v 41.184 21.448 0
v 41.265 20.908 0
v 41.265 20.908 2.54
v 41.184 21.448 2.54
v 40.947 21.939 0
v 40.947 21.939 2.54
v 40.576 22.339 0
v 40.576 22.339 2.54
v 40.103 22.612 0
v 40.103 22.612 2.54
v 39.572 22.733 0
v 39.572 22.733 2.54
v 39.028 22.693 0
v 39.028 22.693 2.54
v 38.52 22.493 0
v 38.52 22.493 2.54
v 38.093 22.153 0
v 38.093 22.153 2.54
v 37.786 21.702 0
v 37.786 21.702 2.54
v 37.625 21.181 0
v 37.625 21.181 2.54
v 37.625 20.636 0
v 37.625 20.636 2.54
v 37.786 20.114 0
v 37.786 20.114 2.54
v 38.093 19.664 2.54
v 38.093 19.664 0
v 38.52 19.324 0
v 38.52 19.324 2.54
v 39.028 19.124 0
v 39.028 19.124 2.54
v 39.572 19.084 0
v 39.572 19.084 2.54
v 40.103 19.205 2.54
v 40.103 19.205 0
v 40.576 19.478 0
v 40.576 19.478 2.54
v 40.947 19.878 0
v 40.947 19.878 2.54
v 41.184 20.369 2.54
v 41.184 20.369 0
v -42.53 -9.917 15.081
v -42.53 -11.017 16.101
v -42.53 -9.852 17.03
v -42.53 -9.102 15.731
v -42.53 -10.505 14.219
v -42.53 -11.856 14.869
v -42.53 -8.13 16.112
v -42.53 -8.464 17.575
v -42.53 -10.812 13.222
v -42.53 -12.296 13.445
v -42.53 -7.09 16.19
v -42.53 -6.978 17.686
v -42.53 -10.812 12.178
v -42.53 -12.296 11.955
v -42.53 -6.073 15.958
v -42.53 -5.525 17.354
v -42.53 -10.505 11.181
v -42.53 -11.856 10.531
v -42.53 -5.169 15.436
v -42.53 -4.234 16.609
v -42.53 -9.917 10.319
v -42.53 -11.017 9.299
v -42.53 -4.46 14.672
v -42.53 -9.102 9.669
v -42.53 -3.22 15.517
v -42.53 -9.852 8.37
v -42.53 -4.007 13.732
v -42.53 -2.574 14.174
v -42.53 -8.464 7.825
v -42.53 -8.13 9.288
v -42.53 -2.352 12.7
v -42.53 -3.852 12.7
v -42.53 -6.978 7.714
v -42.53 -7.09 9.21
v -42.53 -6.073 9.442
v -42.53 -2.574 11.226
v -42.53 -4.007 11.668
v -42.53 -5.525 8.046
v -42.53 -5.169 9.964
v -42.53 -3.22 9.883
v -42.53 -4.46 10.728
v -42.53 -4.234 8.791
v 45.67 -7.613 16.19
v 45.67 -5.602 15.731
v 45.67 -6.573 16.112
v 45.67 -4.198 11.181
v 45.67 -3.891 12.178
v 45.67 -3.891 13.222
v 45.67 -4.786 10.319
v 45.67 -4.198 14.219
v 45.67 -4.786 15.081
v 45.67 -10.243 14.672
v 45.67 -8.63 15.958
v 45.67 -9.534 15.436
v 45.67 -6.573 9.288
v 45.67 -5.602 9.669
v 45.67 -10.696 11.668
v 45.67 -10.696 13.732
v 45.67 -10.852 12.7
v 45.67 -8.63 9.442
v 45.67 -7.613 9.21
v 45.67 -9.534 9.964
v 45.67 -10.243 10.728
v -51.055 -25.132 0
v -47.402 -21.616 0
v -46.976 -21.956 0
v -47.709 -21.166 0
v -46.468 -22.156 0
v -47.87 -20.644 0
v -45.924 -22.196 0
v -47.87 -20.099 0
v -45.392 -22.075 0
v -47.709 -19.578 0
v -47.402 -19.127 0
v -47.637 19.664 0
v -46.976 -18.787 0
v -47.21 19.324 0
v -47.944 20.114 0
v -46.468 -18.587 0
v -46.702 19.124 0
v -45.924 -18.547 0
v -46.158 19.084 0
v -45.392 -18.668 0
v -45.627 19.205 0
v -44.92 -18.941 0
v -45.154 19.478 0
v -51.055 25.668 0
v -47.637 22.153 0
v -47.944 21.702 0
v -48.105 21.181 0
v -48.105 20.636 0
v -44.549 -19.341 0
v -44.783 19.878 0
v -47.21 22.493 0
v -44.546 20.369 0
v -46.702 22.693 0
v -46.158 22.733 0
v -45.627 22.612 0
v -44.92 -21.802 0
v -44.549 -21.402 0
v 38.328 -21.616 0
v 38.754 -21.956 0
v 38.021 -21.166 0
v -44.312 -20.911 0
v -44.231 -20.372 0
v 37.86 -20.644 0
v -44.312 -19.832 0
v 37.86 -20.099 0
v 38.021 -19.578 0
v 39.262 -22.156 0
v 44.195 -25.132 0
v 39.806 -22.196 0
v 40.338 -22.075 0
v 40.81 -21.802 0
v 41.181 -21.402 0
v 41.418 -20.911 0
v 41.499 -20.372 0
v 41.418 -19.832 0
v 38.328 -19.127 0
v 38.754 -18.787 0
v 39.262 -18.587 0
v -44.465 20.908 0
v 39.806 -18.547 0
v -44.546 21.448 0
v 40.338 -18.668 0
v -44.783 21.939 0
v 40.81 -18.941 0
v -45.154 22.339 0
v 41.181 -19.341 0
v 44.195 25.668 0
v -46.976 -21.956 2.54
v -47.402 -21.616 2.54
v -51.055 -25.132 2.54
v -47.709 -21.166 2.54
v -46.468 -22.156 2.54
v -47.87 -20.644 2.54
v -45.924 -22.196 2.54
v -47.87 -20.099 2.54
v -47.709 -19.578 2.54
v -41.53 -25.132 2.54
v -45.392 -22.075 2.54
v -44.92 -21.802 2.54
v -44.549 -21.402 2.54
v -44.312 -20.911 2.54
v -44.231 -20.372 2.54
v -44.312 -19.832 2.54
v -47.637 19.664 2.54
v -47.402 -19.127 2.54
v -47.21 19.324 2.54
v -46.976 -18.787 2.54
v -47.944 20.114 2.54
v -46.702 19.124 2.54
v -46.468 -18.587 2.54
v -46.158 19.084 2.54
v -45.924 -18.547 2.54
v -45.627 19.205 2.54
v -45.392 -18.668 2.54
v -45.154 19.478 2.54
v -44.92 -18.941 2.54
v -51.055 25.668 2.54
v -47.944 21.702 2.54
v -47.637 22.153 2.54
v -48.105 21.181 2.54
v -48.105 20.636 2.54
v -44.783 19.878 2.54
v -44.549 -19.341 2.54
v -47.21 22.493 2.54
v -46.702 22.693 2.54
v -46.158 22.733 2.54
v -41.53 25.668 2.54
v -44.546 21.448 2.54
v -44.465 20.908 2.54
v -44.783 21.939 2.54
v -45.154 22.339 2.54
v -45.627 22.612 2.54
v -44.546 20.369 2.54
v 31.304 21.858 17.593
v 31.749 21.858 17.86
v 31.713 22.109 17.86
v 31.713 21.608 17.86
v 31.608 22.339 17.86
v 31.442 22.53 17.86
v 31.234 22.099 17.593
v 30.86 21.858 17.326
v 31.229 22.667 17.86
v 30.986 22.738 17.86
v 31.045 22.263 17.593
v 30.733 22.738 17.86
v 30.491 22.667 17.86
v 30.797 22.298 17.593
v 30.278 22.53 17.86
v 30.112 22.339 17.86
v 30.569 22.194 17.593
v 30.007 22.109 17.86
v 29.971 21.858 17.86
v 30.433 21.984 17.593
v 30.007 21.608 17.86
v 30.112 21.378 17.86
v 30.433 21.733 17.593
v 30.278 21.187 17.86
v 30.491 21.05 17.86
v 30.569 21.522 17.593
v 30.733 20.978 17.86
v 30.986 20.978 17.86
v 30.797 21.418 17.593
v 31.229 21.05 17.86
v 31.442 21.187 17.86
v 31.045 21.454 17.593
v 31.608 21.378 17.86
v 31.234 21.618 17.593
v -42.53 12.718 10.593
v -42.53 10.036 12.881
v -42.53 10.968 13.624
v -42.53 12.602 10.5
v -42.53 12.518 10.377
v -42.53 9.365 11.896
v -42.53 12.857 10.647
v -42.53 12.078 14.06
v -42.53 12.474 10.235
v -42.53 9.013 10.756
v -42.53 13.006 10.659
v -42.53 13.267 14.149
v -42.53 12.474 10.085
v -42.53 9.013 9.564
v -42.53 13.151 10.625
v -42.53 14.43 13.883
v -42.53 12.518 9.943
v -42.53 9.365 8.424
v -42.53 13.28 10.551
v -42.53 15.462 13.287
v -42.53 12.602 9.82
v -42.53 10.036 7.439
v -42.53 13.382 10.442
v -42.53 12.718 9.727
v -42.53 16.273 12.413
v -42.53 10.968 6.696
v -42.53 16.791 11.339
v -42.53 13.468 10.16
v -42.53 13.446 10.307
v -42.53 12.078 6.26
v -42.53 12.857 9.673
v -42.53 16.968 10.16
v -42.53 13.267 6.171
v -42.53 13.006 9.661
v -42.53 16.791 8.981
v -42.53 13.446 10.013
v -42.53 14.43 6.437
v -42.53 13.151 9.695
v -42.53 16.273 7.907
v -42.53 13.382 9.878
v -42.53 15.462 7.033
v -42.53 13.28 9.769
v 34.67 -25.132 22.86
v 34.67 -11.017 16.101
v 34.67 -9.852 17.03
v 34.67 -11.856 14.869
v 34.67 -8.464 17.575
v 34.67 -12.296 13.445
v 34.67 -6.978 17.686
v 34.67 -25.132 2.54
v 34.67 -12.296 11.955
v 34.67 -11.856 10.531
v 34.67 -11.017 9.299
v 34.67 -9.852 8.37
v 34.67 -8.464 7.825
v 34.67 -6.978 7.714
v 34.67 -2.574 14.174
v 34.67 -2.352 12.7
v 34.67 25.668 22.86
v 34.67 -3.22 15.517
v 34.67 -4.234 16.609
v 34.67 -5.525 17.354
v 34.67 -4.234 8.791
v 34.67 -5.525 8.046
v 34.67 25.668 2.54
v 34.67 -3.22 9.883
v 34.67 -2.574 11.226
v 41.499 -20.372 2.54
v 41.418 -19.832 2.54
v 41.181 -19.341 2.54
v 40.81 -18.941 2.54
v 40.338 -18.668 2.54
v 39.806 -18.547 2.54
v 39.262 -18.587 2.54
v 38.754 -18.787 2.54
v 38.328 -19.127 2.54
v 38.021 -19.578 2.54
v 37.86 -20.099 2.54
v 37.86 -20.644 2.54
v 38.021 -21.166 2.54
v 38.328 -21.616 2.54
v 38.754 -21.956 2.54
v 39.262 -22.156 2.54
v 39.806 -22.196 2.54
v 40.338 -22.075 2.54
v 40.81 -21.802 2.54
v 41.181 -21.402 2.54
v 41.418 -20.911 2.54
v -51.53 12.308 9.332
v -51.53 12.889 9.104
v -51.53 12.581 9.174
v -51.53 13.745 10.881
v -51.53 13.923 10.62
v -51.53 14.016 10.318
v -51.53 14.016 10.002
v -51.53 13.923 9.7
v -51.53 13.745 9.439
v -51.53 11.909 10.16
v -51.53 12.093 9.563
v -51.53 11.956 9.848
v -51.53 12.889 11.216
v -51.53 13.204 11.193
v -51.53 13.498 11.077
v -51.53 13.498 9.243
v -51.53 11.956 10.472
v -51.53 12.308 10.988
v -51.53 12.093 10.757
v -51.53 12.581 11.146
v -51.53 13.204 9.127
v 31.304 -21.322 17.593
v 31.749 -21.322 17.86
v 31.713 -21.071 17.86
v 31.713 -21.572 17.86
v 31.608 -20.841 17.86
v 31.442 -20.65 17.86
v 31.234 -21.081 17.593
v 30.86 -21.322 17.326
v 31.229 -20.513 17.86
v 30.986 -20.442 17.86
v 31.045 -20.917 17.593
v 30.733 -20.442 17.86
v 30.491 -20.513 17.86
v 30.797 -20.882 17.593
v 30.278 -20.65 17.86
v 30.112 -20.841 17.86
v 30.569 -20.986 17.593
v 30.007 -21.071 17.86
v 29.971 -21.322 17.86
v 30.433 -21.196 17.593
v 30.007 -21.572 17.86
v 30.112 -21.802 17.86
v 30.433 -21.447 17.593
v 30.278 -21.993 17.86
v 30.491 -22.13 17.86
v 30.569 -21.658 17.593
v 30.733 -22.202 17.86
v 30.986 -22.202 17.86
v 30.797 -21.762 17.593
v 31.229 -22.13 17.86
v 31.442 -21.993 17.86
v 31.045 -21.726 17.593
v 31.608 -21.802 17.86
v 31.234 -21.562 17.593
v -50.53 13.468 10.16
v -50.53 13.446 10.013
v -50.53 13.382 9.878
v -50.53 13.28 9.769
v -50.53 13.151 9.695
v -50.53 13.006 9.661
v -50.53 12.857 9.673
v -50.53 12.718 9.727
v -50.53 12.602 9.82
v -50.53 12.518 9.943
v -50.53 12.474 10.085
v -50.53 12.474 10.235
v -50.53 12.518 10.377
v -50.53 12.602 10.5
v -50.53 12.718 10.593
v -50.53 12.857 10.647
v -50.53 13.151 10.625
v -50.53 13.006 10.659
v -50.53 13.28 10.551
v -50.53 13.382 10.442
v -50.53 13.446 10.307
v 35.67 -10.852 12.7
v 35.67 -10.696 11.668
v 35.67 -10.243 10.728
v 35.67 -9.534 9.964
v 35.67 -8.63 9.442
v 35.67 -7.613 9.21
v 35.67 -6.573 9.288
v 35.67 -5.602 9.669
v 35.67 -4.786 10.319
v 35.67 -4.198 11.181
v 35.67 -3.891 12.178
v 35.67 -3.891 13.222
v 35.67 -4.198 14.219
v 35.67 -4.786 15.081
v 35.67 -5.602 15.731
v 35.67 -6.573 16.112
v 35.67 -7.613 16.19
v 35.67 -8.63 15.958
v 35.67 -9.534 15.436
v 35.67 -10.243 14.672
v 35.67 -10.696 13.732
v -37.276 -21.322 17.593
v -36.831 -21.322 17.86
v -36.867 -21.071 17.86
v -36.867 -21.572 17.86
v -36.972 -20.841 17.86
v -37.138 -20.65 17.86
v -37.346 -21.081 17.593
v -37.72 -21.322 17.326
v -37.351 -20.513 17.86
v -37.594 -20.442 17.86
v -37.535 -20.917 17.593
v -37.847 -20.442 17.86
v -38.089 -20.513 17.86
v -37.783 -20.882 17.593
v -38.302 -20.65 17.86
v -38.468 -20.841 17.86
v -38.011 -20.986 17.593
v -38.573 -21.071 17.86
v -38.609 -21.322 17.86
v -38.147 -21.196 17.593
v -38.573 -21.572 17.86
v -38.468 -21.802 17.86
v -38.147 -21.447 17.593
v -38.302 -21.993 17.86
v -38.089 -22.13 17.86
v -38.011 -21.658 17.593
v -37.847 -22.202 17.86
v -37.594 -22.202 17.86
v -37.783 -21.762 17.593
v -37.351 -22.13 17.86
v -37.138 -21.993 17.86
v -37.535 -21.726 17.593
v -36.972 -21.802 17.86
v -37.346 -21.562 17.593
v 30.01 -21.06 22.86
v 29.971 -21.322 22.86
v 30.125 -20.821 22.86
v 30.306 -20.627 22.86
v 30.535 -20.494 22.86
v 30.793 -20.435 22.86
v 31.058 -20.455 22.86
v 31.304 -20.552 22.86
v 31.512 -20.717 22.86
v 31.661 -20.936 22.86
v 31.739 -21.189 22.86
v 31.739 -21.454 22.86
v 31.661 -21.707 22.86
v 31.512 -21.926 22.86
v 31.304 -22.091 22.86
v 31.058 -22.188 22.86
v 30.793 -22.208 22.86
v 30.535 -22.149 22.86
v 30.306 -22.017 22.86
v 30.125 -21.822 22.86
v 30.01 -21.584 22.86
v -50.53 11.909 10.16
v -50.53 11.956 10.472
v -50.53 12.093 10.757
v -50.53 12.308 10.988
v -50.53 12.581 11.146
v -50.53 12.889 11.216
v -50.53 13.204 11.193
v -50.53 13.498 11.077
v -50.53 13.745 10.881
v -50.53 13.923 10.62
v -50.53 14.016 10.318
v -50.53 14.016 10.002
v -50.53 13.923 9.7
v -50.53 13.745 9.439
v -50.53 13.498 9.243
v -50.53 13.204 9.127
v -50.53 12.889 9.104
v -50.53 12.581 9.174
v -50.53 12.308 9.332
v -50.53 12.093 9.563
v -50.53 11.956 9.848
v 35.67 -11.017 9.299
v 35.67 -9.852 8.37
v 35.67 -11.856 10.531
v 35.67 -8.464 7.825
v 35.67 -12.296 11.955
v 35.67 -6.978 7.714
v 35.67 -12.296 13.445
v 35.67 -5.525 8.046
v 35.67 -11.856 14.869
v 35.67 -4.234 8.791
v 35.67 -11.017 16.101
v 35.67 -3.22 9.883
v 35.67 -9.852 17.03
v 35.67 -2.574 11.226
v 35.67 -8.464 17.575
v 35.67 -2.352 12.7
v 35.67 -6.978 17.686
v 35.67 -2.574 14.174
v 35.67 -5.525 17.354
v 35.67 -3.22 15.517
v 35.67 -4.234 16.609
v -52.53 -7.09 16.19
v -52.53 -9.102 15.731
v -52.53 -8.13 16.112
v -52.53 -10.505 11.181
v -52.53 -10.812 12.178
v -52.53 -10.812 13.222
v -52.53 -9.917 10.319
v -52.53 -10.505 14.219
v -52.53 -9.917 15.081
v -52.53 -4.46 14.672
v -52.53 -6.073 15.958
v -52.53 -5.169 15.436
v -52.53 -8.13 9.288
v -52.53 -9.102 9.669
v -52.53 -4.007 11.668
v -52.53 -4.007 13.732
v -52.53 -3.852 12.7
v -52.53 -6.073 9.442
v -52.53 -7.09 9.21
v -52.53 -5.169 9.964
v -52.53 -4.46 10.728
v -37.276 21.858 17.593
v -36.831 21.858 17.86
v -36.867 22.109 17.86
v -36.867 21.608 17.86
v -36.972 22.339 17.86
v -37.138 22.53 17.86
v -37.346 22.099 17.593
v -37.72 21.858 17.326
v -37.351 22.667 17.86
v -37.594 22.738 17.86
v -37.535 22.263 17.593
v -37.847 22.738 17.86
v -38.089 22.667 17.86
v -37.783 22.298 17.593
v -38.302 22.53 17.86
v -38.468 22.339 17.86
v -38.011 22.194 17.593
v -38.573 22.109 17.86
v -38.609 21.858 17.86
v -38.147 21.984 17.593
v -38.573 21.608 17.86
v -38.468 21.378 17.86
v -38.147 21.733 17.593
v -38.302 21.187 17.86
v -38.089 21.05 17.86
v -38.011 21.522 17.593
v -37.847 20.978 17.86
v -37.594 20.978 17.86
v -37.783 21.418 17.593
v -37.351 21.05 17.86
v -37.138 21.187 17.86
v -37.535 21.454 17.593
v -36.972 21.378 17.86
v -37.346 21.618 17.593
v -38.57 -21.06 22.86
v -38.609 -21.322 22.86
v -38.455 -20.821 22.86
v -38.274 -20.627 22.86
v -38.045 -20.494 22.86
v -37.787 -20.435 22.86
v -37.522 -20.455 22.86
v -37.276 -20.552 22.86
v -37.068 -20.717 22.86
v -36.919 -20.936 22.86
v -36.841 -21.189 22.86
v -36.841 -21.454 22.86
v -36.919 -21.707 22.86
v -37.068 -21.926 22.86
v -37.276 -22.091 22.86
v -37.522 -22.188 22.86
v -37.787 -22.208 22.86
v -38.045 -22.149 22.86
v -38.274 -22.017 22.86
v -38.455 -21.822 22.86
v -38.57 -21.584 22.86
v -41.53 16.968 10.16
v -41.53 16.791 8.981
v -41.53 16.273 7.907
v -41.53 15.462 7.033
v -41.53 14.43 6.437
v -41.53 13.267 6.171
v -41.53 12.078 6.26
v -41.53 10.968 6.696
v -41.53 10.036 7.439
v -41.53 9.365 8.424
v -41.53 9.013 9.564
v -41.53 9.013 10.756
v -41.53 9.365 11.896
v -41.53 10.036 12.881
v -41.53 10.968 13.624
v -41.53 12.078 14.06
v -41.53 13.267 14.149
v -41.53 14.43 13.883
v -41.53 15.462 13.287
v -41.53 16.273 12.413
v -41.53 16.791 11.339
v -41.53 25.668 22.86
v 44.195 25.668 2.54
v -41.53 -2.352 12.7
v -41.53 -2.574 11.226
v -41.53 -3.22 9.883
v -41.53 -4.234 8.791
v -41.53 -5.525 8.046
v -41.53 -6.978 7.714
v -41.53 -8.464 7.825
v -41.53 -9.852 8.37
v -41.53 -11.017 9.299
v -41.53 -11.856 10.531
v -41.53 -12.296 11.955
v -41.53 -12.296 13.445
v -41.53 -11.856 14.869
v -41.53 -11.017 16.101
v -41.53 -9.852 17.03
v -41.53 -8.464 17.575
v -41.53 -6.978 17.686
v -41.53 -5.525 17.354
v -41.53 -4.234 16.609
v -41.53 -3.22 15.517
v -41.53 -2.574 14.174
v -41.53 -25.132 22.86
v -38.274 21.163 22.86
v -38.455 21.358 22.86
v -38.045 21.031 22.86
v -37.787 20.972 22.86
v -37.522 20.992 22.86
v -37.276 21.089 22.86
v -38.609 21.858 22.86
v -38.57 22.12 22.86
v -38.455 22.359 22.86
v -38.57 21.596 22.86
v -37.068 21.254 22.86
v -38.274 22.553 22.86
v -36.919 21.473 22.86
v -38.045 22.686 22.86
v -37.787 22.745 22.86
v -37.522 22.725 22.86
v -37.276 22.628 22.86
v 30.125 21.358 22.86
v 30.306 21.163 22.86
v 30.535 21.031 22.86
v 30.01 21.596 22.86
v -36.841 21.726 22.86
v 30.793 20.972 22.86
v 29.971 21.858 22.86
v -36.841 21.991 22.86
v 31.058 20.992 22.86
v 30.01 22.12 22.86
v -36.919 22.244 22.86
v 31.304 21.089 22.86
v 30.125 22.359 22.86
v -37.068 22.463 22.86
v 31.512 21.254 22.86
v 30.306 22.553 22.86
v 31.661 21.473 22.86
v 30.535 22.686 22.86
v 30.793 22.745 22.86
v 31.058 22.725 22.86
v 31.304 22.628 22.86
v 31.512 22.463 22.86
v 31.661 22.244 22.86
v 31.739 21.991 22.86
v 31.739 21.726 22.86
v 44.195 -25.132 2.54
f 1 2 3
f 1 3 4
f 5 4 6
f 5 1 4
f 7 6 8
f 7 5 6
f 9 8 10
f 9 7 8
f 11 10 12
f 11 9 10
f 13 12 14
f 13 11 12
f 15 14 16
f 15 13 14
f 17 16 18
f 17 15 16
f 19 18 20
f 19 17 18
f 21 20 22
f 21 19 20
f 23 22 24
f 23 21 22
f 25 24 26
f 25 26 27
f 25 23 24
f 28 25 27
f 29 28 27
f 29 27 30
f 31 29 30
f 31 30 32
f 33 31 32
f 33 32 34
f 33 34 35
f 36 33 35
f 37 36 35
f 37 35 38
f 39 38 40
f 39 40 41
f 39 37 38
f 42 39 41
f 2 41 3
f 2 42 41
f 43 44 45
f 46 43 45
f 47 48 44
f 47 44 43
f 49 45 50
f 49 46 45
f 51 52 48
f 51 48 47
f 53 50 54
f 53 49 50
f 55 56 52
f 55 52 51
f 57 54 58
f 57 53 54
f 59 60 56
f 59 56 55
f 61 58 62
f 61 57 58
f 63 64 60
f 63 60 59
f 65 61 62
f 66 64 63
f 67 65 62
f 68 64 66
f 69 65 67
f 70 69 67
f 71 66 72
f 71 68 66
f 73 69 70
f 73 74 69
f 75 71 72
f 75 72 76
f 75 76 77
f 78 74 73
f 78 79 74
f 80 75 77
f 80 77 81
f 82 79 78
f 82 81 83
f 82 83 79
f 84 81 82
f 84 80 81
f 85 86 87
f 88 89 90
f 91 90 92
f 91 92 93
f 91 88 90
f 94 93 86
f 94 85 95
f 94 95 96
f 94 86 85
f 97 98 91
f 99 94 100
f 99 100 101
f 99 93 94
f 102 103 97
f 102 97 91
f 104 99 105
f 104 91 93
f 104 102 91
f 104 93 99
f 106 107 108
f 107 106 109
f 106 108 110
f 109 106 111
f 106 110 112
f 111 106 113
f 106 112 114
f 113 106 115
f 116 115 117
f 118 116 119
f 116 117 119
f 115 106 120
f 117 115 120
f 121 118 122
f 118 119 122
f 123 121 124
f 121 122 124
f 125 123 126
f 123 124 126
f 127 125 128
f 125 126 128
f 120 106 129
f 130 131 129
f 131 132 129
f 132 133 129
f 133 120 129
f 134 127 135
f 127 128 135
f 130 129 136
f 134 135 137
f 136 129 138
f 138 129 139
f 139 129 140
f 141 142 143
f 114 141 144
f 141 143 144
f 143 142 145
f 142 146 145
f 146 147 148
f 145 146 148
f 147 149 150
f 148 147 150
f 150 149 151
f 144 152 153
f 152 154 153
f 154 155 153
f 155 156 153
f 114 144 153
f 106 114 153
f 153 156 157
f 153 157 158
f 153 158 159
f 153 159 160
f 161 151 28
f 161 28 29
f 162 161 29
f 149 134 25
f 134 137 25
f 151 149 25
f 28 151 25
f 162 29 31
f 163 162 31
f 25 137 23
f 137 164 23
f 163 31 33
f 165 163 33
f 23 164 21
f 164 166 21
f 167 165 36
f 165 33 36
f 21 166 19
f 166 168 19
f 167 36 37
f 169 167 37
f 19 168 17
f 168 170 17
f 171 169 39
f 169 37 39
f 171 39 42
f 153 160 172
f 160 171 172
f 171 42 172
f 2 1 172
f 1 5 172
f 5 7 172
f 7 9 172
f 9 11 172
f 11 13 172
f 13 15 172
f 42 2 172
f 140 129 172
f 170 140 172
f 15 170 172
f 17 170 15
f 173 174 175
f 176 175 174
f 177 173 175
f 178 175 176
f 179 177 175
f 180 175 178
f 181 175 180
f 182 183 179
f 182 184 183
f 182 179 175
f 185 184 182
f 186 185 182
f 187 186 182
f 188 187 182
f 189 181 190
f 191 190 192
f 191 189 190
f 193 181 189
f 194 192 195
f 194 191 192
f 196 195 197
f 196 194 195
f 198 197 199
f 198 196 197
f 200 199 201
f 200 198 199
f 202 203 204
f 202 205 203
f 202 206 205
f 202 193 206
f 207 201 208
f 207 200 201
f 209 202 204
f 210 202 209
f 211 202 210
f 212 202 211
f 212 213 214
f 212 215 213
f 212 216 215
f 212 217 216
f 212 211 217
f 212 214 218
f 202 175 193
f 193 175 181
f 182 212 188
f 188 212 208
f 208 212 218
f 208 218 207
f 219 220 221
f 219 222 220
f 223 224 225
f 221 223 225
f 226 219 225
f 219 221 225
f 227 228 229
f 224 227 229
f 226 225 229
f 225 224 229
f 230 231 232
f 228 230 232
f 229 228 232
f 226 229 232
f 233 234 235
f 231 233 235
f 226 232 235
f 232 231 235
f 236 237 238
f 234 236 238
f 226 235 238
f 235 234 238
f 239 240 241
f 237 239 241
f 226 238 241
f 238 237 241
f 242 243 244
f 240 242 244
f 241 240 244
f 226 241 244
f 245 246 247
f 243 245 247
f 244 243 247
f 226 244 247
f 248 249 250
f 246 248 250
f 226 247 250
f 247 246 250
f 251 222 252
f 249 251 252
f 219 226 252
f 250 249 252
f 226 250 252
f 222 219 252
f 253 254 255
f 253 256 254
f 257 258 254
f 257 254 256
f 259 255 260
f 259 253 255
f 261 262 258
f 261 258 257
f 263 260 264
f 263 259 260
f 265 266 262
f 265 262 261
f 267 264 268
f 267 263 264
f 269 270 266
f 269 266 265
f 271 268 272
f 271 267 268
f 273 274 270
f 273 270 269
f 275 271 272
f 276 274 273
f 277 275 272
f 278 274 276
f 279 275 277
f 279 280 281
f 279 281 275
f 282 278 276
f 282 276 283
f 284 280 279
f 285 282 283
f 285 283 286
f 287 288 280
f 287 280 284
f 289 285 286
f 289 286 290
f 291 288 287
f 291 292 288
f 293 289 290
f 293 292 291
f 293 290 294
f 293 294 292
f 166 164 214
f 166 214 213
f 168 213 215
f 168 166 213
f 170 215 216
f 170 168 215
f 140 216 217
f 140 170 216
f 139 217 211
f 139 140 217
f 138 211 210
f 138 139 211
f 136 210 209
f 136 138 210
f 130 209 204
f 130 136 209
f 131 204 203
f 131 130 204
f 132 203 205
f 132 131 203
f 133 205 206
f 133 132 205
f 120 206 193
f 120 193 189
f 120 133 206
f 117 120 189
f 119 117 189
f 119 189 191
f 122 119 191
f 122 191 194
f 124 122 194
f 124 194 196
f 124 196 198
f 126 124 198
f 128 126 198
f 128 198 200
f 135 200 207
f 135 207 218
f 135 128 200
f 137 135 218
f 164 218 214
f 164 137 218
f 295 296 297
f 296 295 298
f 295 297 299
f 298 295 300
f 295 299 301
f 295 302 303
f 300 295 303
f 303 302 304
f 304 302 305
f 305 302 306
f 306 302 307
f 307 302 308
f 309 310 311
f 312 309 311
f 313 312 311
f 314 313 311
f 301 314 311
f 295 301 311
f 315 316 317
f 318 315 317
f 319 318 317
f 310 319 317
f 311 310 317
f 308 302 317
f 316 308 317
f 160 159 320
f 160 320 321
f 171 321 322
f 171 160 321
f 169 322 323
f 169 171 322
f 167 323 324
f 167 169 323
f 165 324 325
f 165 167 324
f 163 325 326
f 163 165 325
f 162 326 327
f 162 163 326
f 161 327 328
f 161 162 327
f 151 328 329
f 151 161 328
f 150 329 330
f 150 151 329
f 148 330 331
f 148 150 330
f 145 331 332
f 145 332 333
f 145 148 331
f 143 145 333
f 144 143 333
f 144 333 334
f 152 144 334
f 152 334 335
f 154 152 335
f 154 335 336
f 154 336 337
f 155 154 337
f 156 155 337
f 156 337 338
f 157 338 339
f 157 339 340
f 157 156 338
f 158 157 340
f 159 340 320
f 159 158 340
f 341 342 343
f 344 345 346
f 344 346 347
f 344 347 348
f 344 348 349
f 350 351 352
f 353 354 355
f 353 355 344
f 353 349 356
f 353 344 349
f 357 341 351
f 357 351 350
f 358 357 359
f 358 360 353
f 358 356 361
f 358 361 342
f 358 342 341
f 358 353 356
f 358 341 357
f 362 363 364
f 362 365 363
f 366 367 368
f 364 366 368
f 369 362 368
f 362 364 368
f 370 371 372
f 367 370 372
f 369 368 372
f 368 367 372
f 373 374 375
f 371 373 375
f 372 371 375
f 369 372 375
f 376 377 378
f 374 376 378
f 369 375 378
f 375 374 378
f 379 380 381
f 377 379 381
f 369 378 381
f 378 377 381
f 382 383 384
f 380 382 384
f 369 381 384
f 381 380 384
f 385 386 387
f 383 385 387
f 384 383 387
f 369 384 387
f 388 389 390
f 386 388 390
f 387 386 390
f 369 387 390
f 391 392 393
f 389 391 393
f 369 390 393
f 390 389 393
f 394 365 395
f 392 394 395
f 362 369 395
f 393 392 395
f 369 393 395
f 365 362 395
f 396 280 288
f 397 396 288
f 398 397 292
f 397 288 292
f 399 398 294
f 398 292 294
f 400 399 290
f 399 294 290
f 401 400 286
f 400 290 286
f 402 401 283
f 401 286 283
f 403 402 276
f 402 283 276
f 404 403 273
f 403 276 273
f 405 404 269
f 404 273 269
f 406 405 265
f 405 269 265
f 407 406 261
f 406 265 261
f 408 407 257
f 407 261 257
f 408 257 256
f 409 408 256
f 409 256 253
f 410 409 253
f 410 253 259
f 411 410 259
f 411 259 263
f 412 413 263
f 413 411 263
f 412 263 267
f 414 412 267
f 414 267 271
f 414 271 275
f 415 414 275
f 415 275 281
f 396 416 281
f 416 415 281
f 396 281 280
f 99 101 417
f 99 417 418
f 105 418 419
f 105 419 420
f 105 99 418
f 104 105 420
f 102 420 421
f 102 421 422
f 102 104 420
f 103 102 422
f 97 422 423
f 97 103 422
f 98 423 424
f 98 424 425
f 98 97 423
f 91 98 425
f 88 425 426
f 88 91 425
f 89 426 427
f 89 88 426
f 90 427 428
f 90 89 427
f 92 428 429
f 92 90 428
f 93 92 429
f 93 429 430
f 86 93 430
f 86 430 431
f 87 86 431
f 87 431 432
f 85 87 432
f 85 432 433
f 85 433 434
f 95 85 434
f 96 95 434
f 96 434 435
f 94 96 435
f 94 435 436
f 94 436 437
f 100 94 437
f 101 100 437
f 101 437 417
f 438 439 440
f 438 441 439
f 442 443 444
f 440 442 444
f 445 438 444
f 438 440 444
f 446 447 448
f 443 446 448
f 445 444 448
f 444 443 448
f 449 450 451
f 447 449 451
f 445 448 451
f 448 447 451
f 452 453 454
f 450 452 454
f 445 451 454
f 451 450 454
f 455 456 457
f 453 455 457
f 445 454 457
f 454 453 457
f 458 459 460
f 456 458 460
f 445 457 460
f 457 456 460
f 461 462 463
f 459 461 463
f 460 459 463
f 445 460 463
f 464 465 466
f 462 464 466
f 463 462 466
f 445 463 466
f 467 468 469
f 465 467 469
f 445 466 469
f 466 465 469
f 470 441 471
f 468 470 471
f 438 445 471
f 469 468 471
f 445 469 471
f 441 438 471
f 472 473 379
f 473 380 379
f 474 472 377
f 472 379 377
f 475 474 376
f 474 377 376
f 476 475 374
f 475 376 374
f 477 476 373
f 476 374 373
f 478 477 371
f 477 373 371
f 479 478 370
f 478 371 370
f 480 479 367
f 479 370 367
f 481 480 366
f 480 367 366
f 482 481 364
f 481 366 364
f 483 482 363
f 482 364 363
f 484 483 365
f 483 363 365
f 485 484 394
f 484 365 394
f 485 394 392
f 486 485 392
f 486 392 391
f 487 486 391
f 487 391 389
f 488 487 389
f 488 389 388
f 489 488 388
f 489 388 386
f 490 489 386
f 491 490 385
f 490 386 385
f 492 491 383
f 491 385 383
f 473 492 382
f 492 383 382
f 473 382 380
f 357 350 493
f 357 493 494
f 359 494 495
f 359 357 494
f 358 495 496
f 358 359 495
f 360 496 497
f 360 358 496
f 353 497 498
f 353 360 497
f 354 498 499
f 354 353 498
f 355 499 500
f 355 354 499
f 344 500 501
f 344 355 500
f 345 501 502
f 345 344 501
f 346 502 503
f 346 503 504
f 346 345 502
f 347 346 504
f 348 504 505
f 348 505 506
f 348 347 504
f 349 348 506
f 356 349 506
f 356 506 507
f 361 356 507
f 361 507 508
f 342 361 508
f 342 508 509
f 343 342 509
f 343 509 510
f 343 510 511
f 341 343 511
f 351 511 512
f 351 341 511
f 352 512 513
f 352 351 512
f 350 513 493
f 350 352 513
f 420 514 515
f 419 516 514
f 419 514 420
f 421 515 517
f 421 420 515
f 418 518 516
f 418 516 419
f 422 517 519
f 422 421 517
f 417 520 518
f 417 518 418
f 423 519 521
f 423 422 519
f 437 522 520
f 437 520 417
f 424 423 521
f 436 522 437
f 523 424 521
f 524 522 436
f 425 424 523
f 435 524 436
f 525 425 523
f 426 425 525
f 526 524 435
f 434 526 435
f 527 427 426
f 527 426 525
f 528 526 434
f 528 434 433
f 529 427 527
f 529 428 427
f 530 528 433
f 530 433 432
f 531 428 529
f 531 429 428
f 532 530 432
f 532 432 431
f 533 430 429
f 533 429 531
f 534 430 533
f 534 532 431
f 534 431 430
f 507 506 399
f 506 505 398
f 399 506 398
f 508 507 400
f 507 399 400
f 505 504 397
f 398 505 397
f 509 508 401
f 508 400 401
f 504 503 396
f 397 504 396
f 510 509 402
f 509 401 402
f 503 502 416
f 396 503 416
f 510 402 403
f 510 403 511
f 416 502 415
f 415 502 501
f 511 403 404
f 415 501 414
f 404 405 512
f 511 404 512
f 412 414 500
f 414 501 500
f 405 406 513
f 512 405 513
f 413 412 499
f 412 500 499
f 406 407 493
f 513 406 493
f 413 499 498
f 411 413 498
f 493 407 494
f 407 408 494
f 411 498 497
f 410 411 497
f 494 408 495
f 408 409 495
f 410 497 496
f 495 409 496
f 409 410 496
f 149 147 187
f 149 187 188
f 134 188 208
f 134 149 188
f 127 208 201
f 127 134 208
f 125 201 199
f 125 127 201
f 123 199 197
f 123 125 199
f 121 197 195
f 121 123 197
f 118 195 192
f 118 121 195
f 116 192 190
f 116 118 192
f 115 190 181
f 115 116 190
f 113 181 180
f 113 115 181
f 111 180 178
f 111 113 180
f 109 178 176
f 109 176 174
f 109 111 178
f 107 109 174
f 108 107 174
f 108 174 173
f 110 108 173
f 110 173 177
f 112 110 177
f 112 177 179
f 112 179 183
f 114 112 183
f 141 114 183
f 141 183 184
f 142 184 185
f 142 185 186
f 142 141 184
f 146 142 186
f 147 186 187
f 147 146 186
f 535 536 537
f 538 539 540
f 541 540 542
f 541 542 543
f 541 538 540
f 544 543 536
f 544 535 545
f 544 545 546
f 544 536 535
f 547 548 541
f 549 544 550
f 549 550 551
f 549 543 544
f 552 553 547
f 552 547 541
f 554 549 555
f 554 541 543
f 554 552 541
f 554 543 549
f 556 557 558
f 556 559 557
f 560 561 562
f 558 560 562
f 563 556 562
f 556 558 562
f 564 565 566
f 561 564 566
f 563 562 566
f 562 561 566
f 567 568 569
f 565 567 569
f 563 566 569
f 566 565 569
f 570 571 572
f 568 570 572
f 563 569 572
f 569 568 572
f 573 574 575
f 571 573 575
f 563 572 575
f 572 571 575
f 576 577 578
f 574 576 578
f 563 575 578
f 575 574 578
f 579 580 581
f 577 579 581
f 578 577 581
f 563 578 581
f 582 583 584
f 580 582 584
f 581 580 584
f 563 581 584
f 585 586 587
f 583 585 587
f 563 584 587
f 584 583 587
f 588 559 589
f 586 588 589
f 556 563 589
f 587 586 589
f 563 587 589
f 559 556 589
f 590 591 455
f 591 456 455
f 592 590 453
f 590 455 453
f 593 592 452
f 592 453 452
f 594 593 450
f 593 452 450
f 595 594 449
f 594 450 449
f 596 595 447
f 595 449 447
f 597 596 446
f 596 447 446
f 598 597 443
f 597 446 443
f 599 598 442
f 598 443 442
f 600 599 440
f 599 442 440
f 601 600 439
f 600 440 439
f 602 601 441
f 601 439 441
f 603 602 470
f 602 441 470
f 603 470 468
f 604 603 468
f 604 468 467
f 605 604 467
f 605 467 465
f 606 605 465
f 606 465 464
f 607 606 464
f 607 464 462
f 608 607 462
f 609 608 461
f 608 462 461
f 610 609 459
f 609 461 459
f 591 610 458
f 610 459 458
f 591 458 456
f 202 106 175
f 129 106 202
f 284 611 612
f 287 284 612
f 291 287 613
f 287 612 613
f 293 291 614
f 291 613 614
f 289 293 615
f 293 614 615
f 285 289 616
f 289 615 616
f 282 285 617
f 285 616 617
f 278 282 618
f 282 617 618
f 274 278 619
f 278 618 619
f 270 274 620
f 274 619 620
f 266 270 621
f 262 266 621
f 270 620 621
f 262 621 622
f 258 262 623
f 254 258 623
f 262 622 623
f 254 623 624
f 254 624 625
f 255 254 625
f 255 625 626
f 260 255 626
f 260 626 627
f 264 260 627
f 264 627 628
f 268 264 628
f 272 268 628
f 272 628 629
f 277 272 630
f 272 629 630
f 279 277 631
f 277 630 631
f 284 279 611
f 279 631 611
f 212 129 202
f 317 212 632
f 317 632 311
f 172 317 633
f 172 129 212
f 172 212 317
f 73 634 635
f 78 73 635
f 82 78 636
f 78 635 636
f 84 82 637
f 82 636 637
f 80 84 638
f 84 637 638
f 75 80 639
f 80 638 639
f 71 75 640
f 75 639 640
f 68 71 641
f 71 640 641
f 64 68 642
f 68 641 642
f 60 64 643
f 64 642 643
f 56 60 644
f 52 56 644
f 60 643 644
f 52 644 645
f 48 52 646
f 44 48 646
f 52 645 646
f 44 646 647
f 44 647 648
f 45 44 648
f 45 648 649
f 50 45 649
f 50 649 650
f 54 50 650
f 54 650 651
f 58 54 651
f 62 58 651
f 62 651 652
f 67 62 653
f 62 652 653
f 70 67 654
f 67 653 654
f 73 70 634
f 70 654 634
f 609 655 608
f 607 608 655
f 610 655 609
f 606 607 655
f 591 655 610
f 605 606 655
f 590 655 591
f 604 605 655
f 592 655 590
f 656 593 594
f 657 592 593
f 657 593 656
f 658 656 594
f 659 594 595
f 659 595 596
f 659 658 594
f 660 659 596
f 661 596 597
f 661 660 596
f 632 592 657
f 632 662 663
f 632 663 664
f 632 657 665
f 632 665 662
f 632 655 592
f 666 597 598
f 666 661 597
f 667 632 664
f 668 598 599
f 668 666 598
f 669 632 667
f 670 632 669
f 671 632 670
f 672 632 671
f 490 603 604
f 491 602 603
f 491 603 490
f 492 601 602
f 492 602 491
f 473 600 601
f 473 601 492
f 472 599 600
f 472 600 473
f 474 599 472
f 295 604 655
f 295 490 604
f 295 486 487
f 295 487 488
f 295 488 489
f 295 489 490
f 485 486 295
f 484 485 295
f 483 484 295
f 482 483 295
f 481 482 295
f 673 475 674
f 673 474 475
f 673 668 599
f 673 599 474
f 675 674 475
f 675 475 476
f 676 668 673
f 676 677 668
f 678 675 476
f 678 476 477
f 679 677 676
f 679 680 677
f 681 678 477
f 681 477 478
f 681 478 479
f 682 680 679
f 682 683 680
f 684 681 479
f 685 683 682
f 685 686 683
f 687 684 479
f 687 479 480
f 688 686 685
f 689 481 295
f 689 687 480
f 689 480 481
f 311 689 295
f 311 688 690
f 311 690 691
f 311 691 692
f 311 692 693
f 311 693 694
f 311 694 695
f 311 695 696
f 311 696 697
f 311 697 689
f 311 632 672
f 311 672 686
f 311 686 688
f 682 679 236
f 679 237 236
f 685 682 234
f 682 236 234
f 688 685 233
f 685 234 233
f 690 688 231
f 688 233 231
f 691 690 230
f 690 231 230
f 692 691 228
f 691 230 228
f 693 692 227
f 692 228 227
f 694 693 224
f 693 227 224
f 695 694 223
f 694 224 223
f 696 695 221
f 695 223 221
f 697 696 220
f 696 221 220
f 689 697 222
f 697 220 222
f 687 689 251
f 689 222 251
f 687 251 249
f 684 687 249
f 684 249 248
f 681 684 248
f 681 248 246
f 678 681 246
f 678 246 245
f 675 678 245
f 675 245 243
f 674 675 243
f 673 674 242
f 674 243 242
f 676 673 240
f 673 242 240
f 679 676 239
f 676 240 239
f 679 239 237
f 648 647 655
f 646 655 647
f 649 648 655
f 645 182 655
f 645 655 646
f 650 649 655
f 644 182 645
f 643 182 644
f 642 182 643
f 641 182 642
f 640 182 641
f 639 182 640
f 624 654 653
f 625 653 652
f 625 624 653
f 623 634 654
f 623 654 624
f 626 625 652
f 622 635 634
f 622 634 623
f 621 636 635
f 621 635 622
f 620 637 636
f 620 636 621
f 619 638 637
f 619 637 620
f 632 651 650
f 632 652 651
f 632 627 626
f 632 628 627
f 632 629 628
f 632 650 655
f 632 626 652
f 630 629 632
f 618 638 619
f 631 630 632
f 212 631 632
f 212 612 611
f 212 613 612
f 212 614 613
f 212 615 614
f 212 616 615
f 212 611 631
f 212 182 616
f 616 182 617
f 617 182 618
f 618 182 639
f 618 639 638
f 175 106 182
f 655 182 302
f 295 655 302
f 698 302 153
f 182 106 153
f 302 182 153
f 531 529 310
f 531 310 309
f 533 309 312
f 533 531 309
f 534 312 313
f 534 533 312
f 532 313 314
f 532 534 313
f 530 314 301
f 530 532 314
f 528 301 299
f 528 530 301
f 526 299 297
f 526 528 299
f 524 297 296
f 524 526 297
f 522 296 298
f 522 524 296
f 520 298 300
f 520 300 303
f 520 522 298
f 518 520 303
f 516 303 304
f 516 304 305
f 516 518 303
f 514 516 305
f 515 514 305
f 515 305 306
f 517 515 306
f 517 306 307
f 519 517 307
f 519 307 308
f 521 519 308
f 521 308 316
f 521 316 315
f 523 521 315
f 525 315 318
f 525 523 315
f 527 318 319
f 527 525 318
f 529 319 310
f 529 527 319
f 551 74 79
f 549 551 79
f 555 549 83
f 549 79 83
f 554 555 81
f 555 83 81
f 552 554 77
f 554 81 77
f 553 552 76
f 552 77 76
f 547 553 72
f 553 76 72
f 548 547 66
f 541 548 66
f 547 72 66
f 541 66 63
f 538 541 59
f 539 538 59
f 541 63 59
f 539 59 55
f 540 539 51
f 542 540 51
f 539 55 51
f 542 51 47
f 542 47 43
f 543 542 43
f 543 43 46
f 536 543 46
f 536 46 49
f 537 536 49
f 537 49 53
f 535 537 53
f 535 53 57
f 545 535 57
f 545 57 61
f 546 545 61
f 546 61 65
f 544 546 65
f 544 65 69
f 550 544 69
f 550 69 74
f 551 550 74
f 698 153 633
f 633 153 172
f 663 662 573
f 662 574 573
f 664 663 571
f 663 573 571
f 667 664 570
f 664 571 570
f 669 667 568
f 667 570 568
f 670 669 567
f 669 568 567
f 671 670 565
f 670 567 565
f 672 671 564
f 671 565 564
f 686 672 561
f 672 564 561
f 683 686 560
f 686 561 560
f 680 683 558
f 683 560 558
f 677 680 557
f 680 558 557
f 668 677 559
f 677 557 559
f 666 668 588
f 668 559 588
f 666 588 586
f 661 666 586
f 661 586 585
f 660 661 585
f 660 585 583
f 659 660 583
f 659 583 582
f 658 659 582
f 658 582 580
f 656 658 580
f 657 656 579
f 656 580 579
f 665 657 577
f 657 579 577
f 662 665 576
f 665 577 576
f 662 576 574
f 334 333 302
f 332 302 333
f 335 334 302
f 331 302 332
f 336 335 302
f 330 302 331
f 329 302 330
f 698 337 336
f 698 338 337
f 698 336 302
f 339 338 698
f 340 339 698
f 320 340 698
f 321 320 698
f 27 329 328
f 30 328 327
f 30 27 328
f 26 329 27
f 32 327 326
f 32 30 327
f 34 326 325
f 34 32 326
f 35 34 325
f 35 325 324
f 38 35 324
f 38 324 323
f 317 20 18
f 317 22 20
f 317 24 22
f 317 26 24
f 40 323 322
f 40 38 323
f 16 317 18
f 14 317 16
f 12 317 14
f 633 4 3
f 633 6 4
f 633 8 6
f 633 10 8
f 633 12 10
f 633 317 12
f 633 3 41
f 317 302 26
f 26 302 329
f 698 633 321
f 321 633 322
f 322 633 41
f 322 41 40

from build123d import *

# Parameters (mm, degrees)
SZKIC1_W                    = 95.25
SZKIC1_H                    = 50.8
SZKIC1_R                    = 1.83
DODANIE_WYCI_GNI_CIE1_DEPTH = 2.54
SZKIC2_W                    = 76.2
SZKIC2_H                    = 50.8
DODANIE_WYCI_GNI_CIE2_DEPTH = 20.32
OTW_R_50_0_07_1_D           = 1.778
OTW_R_50_0_07_1_DEPTH       = 5
OTW_R_50_0_07_1_TIP         = 0.53416509
SZKIC6_R                    = 3.5
DODANIE_WYCI_GNI_CIE3_DEPTH = 11
SZKIC7_R                    = 5
DODANIE_WYCI_GNI_CIE4_DEPTH = 1
DODANIE_WYCI_GNI_CIE5_START = 11
SZKIC8_R                    = 3.5
DODANIE_WYCI_GNI_CIE5_DEPTH = 11
DODANIE_WYCI_GNI_CIE6_START = 1
SZKIC9_R                    = 5
DODANIE_WYCI_GNI_CIE6_DEPTH = 1
SZKIC10_R                   = 0.5
DODANIE_WYCI_GNI_CIE7_DEPTH = 10
SZKIC12_R                   = 1.059326458
DODANIE_WYCI_GNI_CIE8_DEPTH = 1
SZKIC11_R                   = 4
DODANIE_WYCI_GNI_CIE9_DEPTH = 1


with BuildPart() as part:
    # Szkic1 → Dodanie-wyciągnięcie1 (new body)
    with BuildSketch(Plane.XY):
        with Locations((-3.430103099, 0.268410085)):
            Rectangle(SZKIC1_W, SZKIC1_H)
        with Locations((-46.060693789, -20.371589915)):
            Circle(SZKIC1_R, mode=Mode.SUBTRACT)
        with Locations((-46.295103099, 20.908410085)):
            Circle(SZKIC1_R, mode=Mode.SUBTRACT)
        with Locations((39.434896901, 20.908410085)):
            Circle(SZKIC1_R, mode=Mode.SUBTRACT)
        with Locations((39.669306211, -20.371589915)):
            Circle(SZKIC1_R, mode=Mode.SUBTRACT)
    extrude(amount=DODANIE_WYCI_GNI_CIE1_DEPTH)

    # Szkic2 → Dodanie-wyciągnięcie2 (add)
    with BuildSketch(Plane.XY.offset(2.54)):
        with Locations((-3.430103099, 0.268410085)):
            Rectangle(SZKIC2_W, SZKIC2_H)
    extrude(amount=DODANIE_WYCI_GNI_CIE2_DEPTH)

    # Otwór #50 (0.07)1
    with Locations(Plane.XY.offset(22.86)):
        with Locations((-37.720103099, 21.858410085), (30.859896901, 21.858410085), (30.859896901, -21.321589915), (-37.720103099, -21.321589915)):
            Hole(OTW_R_50_0_07_1_D / 2, depth=OTW_R_50_0_07_1_DEPTH)
            with Locations((0, 0, -(OTW_R_50_0_07_1_DEPTH + OTW_R_50_0_07_1_TIP / 2))):  # 118° drill point
                Cone(0, OTW_R_50_0_07_1_D / 2, OTW_R_50_0_07_1_TIP, mode=Mode.SUBTRACT)

    # Szkic6 → Dodanie-wyciągnięcie3 (add)
    with BuildSketch(Plane.ZY.offset(41.530103099)):
        with Locations(Location((12.7, -7.351589915, 0), (0, 0, 90))):
            Circle(SZKIC6_R)
    extrude(amount=DODANIE_WYCI_GNI_CIE3_DEPTH)

    # Szkic7 → Dodanie-wyciągnięcie4 (add)
    with BuildSketch(Plane.ZY.offset(41.530103099)):
        with Locations(Location((12.7, -7.351589915, 0), (0, 0, 90))):
            Circle(SZKIC7_R)
    extrude(amount=DODANIE_WYCI_GNI_CIE4_DEPTH)

    # Szkic8 → Dodanie-wyciągnięcie5 (add)
    with BuildSketch(Plane(origin=(34.669896901, 0, 0), x_dir=(0, 0, -1), z_dir=(1, 0, 0)).offset(DODANIE_WYCI_GNI_CIE5_START)):
        with Locations(Location((-12.7, -7.351589915, 0), (0, 0, 270))):
            Circle(SZKIC8_R)
    extrude(amount=-DODANIE_WYCI_GNI_CIE5_DEPTH)

    # Szkic9 → Dodanie-wyciągnięcie6 (add)
    with BuildSketch(Plane(origin=(34.669896901, 0, 0), x_dir=(0, 0, -1), z_dir=(1, 0, 0)).offset(DODANIE_WYCI_GNI_CIE6_START)):
        with Locations(Location((-12.7, -7.351589915, 0), (0, 0, 90))):
            Circle(SZKIC9_R)
    extrude(amount=-DODANIE_WYCI_GNI_CIE6_DEPTH)

    # Szkic10 → Dodanie-wyciągnięcie7 (add)
    with BuildSketch(Plane.ZY.offset(41.530103099)):
        with Locations(Location((10.16, 12.968410085, 0), (0, 0, 90))):
            Circle(SZKIC10_R)
    extrude(amount=DODANIE_WYCI_GNI_CIE7_DEPTH)

    # Szkic12 → Dodanie-wyciągnięcie8 (add)
    with BuildSketch(Plane.ZY.offset(51.530103099)):
        with Locations(Location((10.16, 12.968410085, 0), (0, 0, 270))):
            Circle(SZKIC12_R)
    extrude(amount=-DODANIE_WYCI_GNI_CIE8_DEPTH)

    # Szkic11 → Dodanie-wyciągnięcie9 (add)
    with BuildSketch(Plane.ZY.offset(41.530103099)):
        with Locations(Location((10.16, 12.968410085, 0), (0, 0, 90))):
            Circle(SZKIC11_R)
    extrude(amount=DODANIE_WYCI_GNI_CIE9_DEPTH)


solid = part.part
